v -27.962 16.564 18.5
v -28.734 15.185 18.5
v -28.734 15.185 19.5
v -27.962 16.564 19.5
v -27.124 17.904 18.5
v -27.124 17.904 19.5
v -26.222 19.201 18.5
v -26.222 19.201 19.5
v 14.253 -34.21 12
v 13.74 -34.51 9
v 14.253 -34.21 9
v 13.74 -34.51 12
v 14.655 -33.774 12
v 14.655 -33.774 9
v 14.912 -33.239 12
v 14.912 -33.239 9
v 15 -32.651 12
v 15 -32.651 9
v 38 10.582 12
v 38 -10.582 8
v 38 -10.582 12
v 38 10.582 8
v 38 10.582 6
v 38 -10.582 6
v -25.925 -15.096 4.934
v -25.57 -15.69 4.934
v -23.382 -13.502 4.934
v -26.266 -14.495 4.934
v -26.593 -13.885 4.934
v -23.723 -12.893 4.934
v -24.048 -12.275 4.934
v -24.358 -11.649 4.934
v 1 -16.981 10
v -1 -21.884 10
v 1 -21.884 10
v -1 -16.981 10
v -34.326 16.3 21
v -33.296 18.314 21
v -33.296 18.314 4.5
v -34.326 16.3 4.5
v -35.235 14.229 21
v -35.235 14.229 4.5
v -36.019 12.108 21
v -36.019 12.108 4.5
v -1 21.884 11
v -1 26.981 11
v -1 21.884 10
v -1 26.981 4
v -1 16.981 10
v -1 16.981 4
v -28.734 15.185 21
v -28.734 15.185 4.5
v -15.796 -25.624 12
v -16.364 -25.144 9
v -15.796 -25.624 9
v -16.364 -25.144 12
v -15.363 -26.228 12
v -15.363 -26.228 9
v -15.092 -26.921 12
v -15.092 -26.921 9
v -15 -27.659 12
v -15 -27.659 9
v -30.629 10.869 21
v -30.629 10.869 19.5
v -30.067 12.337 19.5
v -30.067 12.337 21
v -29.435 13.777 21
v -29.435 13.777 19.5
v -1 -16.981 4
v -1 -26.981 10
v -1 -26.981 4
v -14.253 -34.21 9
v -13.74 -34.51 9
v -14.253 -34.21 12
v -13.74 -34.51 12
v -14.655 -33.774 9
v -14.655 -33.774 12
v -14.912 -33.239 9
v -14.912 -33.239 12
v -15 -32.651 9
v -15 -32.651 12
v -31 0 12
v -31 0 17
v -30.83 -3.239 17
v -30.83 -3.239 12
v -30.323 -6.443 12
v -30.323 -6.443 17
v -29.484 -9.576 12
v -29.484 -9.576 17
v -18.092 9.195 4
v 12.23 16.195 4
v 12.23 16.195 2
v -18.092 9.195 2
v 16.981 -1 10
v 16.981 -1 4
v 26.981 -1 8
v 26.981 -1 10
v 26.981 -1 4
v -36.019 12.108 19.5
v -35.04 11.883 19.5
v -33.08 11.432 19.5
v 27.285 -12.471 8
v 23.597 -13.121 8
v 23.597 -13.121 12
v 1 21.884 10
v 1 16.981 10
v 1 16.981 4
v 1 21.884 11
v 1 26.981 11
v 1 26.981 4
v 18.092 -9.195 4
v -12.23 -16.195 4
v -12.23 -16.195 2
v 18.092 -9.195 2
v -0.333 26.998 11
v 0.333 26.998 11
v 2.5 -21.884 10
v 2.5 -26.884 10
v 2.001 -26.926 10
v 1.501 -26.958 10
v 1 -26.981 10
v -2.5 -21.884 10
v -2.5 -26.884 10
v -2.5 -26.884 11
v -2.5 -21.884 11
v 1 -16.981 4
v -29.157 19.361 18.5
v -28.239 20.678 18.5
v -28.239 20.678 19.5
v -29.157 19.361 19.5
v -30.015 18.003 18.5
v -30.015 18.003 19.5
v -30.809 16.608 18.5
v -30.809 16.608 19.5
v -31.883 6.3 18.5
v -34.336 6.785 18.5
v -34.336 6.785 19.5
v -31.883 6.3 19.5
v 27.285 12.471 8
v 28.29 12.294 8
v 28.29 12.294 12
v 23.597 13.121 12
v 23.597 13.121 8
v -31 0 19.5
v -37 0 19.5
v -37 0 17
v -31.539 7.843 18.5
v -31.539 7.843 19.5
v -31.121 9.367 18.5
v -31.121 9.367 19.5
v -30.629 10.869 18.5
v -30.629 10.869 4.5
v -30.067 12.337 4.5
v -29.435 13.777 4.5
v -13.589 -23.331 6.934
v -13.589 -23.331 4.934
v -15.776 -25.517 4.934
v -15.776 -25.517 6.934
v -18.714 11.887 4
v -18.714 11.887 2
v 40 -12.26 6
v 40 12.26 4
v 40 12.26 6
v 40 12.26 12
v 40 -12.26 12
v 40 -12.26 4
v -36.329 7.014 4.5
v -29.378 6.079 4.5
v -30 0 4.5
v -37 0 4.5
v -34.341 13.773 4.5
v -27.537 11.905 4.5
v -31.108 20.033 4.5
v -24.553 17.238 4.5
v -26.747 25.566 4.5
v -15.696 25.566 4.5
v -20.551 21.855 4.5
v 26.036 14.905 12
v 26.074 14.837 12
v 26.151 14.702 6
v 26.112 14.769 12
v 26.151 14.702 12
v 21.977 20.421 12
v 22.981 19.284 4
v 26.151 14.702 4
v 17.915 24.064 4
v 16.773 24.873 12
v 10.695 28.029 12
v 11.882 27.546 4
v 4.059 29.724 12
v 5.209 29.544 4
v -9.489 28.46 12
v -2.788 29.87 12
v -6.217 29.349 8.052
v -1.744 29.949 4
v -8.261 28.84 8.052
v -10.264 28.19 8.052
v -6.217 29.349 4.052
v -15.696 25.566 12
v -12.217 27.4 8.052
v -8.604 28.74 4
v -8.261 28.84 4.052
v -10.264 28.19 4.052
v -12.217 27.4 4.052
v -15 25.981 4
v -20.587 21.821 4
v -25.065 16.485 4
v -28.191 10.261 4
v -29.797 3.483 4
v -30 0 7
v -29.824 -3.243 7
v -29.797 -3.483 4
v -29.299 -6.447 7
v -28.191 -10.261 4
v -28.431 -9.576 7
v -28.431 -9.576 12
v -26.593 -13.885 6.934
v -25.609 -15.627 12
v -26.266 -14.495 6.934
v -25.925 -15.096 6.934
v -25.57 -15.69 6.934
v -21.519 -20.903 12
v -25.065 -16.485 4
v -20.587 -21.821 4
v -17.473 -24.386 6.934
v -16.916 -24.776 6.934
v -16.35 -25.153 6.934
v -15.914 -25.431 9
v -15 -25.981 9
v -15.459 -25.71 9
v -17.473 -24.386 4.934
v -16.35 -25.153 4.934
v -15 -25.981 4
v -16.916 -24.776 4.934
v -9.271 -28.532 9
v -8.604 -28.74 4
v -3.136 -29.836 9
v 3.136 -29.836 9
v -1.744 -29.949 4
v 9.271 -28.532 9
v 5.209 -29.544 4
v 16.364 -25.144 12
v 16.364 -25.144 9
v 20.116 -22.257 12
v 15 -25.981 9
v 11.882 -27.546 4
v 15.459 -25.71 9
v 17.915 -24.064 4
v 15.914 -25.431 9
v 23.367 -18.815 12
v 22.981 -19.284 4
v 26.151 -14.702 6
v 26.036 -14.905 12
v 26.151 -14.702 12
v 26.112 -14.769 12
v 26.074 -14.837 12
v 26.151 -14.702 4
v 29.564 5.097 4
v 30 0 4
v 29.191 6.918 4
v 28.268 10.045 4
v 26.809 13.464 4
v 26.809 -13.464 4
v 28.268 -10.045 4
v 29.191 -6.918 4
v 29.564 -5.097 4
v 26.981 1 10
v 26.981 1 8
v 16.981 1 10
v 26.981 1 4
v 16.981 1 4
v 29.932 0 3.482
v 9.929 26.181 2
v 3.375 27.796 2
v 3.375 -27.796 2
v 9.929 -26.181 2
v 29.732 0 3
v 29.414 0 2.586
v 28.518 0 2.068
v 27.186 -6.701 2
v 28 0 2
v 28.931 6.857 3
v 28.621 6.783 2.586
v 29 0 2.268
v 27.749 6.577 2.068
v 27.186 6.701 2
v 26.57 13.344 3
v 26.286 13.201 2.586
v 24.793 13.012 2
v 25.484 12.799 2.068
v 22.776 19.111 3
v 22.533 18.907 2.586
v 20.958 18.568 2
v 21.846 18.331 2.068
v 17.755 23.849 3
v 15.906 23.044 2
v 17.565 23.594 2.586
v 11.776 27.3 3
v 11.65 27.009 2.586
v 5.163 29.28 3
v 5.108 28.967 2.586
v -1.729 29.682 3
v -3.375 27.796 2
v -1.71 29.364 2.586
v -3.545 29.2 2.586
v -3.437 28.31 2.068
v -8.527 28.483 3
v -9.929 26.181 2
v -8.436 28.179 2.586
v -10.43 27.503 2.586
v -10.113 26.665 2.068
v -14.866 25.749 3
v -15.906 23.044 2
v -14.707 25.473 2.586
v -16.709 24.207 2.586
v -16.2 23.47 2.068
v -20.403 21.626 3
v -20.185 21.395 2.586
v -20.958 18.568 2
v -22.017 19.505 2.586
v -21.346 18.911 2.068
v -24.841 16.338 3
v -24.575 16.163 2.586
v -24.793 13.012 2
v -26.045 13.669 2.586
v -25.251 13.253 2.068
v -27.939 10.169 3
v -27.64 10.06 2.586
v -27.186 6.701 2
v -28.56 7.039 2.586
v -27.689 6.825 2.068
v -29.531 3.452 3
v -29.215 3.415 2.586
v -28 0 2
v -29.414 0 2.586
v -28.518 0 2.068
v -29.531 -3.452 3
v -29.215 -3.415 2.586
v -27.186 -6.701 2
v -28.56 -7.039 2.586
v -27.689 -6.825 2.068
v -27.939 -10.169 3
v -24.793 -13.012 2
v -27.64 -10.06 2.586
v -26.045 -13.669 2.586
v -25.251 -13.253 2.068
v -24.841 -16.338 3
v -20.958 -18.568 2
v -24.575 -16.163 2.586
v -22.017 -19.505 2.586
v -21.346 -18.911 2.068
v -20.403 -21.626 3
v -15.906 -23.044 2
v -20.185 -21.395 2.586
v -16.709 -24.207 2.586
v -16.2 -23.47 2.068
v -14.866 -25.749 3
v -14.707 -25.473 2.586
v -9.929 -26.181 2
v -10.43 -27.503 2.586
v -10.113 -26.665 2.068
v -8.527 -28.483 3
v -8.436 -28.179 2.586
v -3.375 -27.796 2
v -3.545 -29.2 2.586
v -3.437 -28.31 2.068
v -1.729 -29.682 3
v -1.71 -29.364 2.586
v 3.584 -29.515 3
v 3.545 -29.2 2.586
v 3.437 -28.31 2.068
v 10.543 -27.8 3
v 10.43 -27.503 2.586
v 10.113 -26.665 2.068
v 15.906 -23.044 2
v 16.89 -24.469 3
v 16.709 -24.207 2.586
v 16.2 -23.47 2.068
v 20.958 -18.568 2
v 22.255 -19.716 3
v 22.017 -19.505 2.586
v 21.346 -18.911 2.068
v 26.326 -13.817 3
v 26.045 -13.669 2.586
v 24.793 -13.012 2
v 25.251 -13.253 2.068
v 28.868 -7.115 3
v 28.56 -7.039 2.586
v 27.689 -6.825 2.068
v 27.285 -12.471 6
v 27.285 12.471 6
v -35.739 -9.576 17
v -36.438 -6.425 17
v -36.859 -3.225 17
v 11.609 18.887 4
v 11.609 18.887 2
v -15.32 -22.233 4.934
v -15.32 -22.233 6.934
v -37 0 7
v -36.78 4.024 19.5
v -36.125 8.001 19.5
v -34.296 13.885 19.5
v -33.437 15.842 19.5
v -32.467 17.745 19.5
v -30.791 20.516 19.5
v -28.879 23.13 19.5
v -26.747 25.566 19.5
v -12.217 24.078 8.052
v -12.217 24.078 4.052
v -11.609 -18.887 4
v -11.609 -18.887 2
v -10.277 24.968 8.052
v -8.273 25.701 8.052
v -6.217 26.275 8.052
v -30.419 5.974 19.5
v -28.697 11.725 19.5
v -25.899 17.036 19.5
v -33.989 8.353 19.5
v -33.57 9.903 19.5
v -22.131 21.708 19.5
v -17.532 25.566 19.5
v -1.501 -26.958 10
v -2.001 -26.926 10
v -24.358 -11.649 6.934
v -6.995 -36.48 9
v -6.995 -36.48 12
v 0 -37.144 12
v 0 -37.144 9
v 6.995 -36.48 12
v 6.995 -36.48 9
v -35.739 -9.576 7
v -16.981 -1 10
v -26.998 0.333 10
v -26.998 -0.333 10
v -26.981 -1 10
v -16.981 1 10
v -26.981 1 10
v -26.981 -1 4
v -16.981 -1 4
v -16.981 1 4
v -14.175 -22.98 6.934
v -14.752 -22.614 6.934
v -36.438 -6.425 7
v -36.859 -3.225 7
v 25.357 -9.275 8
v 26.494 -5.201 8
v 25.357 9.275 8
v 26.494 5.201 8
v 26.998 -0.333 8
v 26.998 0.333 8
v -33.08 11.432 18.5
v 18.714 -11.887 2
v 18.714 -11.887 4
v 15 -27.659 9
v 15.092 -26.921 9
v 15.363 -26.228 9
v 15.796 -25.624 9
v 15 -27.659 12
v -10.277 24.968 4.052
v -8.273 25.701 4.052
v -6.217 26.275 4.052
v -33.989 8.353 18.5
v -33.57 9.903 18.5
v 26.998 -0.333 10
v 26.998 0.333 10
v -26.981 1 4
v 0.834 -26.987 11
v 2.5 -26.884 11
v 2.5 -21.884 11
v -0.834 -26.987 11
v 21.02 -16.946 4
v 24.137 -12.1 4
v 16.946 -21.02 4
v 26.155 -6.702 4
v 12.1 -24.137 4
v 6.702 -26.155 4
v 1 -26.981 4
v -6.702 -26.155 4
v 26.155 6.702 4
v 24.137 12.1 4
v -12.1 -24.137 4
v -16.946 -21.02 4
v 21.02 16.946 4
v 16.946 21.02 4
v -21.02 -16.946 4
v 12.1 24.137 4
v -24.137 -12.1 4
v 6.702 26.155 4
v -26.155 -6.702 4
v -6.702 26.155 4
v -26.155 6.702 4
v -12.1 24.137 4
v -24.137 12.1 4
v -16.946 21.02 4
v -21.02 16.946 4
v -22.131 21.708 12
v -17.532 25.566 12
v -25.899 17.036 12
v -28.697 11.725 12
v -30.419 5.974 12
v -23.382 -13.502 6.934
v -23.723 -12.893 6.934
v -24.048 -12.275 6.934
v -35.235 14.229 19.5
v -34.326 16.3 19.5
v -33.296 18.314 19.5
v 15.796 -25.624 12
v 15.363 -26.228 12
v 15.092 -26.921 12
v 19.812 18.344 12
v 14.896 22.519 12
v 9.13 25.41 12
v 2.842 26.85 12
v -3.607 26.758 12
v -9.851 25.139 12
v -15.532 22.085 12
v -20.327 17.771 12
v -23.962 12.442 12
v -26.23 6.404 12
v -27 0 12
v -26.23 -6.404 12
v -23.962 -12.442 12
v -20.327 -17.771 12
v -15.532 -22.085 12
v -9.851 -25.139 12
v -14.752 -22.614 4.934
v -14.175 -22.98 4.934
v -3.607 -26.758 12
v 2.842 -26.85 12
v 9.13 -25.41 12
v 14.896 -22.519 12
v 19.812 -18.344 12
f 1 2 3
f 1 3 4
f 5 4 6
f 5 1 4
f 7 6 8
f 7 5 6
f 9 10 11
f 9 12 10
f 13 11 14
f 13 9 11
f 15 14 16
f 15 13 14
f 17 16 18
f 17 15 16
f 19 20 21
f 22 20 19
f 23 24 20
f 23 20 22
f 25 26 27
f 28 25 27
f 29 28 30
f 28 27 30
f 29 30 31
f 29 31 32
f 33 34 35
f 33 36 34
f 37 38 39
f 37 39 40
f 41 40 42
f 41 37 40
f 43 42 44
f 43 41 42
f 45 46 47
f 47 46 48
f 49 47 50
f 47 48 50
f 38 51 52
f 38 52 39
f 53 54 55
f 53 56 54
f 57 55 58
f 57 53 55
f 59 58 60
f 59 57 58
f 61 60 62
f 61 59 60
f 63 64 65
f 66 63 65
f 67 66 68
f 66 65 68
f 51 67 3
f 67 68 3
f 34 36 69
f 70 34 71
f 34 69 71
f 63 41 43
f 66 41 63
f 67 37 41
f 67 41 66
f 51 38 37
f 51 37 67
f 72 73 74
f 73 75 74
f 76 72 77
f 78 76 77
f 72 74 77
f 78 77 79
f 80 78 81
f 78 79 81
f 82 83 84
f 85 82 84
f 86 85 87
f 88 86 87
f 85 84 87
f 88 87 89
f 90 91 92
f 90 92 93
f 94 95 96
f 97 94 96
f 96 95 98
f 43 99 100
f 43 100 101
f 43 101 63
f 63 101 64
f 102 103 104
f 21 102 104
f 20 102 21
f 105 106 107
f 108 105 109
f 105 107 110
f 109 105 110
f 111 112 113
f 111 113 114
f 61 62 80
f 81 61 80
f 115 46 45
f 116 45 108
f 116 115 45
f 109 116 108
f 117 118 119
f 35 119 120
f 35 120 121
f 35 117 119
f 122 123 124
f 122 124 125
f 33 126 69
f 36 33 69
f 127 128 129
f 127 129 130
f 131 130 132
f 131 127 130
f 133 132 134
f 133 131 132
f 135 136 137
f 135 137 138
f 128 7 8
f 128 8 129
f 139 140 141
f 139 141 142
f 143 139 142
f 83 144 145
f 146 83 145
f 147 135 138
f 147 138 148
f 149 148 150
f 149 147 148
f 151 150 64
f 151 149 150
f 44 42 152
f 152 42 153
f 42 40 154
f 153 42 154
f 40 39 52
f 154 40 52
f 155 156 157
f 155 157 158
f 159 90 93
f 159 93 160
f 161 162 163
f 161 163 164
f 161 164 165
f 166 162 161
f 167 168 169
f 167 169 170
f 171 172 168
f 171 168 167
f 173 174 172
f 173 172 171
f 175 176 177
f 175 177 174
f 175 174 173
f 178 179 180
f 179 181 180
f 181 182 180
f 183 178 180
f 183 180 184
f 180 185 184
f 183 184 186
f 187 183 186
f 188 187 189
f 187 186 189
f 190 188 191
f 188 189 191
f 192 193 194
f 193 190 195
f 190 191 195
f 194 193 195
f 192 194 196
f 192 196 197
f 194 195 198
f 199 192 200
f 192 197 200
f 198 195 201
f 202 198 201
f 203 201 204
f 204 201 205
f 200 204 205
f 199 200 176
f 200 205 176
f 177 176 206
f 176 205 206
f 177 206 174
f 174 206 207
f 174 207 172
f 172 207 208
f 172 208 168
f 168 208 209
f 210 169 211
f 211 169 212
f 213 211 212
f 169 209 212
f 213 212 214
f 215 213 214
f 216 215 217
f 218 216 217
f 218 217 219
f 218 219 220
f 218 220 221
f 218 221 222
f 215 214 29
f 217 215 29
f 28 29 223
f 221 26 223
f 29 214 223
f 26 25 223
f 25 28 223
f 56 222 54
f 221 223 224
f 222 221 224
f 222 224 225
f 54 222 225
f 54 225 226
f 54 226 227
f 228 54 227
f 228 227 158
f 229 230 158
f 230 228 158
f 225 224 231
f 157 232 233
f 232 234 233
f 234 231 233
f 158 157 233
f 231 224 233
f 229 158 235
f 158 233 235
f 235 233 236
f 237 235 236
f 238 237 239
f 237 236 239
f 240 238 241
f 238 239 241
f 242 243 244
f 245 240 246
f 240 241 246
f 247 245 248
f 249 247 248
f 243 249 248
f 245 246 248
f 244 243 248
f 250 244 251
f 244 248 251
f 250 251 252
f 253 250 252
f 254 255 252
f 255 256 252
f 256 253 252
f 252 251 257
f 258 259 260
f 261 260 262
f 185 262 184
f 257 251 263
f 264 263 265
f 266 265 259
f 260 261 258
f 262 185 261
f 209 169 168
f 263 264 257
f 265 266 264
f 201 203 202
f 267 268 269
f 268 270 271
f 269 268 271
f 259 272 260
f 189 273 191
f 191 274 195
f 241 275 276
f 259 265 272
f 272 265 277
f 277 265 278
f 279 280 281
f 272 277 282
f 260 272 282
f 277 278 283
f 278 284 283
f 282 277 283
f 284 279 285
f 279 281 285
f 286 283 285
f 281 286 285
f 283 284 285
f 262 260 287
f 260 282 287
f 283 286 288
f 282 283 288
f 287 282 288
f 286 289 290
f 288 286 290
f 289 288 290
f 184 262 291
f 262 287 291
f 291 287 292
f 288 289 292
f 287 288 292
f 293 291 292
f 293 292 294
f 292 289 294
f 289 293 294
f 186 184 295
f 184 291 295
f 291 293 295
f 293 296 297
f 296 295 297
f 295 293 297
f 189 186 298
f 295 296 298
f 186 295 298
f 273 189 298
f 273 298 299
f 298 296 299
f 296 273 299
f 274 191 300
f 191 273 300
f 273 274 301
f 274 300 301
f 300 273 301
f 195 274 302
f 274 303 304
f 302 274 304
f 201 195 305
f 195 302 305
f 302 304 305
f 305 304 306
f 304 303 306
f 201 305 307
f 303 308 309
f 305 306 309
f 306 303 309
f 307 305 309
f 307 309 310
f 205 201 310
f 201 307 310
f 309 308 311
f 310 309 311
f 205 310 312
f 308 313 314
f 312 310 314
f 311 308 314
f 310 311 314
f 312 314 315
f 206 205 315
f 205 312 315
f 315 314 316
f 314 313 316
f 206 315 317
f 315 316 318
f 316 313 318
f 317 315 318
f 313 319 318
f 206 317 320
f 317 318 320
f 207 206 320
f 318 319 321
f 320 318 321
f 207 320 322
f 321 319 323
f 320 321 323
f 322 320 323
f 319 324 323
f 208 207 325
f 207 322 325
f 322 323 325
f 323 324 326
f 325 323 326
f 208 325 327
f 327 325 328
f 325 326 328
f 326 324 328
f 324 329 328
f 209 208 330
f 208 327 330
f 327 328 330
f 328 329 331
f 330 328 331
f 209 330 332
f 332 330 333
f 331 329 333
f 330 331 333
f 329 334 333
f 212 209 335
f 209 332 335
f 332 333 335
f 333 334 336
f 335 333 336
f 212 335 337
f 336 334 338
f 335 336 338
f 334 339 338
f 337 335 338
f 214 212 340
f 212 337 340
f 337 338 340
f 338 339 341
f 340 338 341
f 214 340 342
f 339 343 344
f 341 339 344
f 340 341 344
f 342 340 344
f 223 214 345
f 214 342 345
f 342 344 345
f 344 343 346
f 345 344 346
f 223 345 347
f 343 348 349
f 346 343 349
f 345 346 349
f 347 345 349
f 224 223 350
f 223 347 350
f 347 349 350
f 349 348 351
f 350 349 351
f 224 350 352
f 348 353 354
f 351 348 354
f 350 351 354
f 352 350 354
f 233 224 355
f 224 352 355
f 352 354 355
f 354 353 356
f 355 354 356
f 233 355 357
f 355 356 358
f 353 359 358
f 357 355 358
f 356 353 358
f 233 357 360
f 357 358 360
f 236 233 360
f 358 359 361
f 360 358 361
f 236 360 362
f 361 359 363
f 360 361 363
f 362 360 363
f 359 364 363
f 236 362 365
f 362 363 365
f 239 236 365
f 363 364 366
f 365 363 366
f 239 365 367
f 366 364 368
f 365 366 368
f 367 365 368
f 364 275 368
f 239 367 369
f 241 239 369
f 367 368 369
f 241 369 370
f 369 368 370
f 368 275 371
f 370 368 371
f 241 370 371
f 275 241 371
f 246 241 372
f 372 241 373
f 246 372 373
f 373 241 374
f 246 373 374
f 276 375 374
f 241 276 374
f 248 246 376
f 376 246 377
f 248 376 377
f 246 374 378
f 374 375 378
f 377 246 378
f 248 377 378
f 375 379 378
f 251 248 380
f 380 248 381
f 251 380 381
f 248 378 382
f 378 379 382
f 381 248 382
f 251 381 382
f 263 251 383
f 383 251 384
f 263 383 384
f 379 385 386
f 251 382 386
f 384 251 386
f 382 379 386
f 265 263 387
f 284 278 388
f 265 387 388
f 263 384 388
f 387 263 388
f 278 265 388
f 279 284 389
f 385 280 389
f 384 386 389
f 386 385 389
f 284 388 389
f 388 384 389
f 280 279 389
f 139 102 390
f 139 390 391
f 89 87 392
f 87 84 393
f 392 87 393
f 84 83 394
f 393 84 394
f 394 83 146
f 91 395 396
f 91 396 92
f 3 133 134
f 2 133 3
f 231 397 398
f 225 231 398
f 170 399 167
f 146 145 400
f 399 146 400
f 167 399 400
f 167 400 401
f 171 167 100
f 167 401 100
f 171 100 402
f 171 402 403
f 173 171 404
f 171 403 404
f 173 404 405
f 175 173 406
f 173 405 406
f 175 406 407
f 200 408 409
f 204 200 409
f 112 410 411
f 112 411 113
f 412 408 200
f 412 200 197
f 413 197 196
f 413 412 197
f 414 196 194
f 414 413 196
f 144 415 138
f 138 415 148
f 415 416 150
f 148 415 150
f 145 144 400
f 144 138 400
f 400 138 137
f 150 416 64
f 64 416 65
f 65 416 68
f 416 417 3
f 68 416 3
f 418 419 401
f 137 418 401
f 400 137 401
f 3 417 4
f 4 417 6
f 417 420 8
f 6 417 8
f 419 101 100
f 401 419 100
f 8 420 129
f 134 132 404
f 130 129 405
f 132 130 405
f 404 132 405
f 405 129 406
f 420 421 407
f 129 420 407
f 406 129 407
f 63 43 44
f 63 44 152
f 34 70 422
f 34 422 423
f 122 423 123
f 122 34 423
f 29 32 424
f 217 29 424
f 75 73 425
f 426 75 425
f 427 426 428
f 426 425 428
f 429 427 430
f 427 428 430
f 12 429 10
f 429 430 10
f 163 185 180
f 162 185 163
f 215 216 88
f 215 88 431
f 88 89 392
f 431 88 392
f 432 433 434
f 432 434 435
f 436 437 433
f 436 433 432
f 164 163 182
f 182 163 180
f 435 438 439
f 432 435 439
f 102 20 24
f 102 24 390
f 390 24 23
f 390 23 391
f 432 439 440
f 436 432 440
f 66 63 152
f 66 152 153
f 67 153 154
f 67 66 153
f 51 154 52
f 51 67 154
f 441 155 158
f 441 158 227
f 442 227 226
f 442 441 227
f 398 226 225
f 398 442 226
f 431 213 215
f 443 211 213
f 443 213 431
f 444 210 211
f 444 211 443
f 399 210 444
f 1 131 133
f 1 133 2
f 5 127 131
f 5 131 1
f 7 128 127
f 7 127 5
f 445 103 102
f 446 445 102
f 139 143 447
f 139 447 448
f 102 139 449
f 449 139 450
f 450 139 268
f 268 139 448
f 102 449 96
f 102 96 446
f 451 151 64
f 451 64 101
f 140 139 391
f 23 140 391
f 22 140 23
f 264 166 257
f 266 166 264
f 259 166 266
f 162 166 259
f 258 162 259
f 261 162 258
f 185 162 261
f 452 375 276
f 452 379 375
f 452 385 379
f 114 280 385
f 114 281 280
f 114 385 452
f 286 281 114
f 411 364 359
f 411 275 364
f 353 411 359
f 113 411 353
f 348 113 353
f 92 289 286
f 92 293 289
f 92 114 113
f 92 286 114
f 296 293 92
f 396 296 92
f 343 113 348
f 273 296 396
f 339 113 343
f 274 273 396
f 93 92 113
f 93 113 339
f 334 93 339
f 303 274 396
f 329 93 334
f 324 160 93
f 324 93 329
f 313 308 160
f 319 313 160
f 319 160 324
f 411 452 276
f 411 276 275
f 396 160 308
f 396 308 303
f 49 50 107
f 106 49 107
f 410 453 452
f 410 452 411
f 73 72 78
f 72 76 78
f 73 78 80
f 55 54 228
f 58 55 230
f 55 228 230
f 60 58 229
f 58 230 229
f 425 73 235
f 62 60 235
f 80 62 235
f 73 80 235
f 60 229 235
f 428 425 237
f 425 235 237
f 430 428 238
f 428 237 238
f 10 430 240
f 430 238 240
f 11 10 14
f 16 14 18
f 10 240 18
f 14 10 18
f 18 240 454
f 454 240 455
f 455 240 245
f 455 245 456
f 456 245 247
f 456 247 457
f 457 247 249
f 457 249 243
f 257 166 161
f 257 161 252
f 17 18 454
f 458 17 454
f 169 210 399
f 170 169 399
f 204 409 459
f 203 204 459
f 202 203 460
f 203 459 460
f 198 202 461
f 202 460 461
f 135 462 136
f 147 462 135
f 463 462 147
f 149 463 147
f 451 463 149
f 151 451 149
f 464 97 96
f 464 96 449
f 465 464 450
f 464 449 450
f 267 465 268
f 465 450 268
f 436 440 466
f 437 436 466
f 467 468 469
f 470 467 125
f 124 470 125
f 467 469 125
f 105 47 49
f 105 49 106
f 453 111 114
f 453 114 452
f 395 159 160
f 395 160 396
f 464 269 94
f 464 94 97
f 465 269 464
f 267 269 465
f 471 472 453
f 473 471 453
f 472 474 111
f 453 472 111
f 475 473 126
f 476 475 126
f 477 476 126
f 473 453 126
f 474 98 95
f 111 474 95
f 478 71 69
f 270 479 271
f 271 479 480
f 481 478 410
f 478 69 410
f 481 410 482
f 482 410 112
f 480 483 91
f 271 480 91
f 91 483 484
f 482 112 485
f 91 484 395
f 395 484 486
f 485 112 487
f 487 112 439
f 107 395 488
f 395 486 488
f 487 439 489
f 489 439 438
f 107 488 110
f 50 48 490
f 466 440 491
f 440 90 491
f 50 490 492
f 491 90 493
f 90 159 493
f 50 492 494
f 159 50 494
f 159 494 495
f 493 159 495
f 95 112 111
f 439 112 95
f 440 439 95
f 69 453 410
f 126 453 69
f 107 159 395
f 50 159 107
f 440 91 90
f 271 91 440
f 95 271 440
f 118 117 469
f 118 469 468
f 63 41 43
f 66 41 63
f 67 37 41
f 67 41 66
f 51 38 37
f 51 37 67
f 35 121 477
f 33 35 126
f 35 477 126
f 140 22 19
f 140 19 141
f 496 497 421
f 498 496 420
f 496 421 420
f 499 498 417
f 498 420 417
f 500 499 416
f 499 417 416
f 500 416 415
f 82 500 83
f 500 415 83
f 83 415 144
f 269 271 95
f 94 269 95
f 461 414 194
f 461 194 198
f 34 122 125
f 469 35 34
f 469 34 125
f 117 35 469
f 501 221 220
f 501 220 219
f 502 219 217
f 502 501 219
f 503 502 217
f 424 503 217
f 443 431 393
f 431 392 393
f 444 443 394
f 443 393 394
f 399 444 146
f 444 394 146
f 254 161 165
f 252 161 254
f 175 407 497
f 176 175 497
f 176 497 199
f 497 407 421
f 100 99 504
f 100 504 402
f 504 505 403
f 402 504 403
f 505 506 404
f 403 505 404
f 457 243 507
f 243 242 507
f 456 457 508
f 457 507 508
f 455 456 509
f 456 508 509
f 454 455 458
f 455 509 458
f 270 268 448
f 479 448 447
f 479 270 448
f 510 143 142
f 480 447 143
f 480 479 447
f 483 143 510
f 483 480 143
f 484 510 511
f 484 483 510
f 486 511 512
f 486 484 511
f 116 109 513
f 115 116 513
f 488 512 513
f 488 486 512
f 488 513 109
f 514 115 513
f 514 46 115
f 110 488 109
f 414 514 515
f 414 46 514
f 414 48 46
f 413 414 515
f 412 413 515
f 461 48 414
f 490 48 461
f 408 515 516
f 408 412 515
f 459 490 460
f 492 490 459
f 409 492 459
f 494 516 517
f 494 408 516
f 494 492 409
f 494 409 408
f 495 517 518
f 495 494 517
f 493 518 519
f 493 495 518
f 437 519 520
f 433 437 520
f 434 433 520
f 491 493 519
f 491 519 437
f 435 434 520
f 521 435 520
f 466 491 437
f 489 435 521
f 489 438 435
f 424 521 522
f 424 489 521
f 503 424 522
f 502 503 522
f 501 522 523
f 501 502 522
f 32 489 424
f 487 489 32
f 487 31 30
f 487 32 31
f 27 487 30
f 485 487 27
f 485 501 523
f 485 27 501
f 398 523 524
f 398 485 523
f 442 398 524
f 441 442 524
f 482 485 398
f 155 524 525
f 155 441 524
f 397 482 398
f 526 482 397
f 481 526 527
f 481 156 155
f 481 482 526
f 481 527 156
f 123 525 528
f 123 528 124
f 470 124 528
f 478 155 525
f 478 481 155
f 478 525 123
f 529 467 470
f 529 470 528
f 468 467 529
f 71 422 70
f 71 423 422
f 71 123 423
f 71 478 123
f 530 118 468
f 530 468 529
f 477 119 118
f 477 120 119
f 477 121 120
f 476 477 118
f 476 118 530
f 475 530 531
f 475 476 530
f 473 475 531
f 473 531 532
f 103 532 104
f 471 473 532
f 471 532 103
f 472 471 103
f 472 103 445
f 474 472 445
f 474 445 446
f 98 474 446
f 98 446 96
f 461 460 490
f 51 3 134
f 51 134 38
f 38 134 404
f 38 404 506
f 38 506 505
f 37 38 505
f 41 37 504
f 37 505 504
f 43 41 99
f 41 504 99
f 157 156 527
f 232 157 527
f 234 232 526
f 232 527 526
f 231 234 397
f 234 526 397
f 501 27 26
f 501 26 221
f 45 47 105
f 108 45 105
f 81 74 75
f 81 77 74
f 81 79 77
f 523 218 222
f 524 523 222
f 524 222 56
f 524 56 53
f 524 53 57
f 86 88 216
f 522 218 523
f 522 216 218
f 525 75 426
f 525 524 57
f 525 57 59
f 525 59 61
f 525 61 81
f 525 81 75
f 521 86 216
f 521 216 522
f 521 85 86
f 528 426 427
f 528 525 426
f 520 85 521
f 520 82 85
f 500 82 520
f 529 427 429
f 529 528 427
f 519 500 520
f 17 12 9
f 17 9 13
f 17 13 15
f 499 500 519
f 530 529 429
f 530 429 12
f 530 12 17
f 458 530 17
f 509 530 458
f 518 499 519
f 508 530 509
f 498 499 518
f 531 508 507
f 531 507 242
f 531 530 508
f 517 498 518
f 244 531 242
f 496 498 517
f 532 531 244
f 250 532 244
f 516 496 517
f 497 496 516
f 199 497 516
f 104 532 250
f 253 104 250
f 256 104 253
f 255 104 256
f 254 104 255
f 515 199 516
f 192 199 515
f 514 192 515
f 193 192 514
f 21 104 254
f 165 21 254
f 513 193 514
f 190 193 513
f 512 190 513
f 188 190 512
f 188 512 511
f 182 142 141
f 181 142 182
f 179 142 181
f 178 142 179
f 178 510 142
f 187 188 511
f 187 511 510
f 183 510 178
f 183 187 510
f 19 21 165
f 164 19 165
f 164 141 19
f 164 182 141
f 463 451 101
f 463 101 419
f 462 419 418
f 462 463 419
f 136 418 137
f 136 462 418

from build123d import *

# Parameters (mm, degrees)
SKETCH_1_R           = 30
EXTRUDE_1_DEPTH      = 2
SKETCH_5_R           = 30
SKETCH_5_R_2         = 27
EXTRUDE_2_DEPTH      = 10
EXTRUDE_START        = -3
EXTRUDE_3_DEPTH      = 3
FILLET_2_R           = 3
FILLET_3_R           = 3
EXTRUDE_START_2      = -6
EXTRUDE_4_DEPTH      = 6
EXTRUDE_6_DEPTH      = 7.5
SKETCH_14_R          = 31
CUT_EXTRUDE_3_DEPTH  = 7.5
CHAMFER_4_SIZE       = 2.644904711
CHAMFER_4_SIZE_2     = 15
CHAMFER_5_SIZE       = 2.644904711
CHAMFER_5_SIZE_2     = 15
CUT_EXTRUDE_START    = -4
CUT_EXTRUDE_6_DEPTH  = 4
EXTRUDE_10_DEPTH     = 5
CUT_EXTRUDE_START_2  = 6
CUT_EXTRUDE_7_DEPTH  = 6
EXTRUDE_11_DEPTH     = 8
EXTRUDE_12_DEPTH     = 1
EXTRUDE_13_DEPTH     = 1.5
EXTRUDE_14_DEPTH     = 16.5
CUT_EXTRUDE_START_3  = -1
CUT_EXTRUDE_8_DEPTH  = 1
EXTRUDE_START_3      = 2
EXTRUDE_15_DEPTH     = 2
CUT_EXTRUDE_9_DEPTH  = 2
SKETCH_33_R          = 30
CUT_EXTRUDE_10_DEPTH = 2
SKETCH_34_R          = 30
EXTRUDE_16_DEPTH     = 2
FILLET_4_R           = 2
FILLET_5_R           = 2
CUT_EXTRUDE_11_DEPTH = 10
FILLET_6_R           = 2
SKETCH_37_W          = 2
SKETCH_37_H          = 2
CUT_EXTRUDE_12_DEPTH = 65
SKETCH_38_W          = 6
SKETCH_38_H          = 4
CUT_EXTRUDE_14_DEPTH = 45


# Some blends are built 0.0001 mm under size
with BuildPart() as part:
    # 草图1 → 凸台-拉伸1 (new body)
    with BuildSketch(Plane.XY):
        Circle(SKETCH_1_R)
    extrude(amount=EXTRUDE_1_DEPTH)

    # 草图5 → 凸台-拉伸2 (add)
    with BuildSketch(Plane.XY.offset(2)):
        Circle(SKETCH_5_R)
        Circle(SKETCH_5_R_2, mode=Mode.SUBTRACT)
    extrude(amount=EXTRUDE_2_DEPTH)

    # 草图6 → 凸台-拉伸3 (add)
    with BuildSketch(Plane.XY.offset(12).offset(EXTRUDE_START)):
        with BuildLine():
            Line((-15, -25.980762114), (-15, -33.980762114))
            ThreePointArc((-15, -33.980762114), (0, -37.144208079), (15, -33.980762114))
            Line((15, -33.980762114), (15, -25.980762114))
            ThreePointArc((15, -25.980762114), (0, -30), (-15, -25.980762114))
        make_face()
    extrude(amount=EXTRUDE_3_DEPTH)

    # 圆角2
    fillet_2_edges = [part.edges().sort_by_distance(p)[0] for p in [
        (-15, -25.980762114, 10.5),
    ]]
    fillet(fillet_2_edges, radius=FILLET_2_R)

    # 圆角3
    fillet_3_edges = [part.edges().sort_by_distance(p)[0] for p in [
        (15, -25.980762114, 10.5),
    ]]
    fillet(fillet_3_edges, radius=FILLET_3_R)

    # 草图8 → 凸台-拉伸4 (add)
    with BuildSketch(Plane.XY.offset(12).offset(EXTRUDE_START_2)):
        with BuildLine():
            Line((26.035573303, -14.90466111), (40, -14.90466111))
            Line((40, -14.90466111), (40, 14.90466111))
            Line((40, 14.90466111), (26.035573303, 14.90466111))
            ThreePointArc((26.035573303, 14.90466111), (30, 0), (26.035573303, -14.90466111))
        make_face()
    extrude(amount=EXTRUDE_4_DEPTH)

    # 草图13 → 凸台-拉伸6 (add, symmetric)
    with BuildSketch(Plane.XY.offset(12)):
        with BuildLine():
            Line((-26.746575291, 25.566006927), (-15.696473801, 25.566006927))
            ThreePointArc((-15.696473801, 25.566006927), (-26.181044804, 14.647624141), (-30, 0))
            Line((-30, 0), (-37, 0))
            ThreePointArc((-37, 0), (-34.341107188, 13.772739637), (-26.746575291, 25.566006927))
        make_face()
    extrude(amount=EXTRUDE_6_DEPTH, both=True)

    # 草图14 → 切除-拉伸3 (cut)
    with BuildSketch(Plane.XY.offset(19.5)):
        Circle(SKETCH_14_R)
    extrude(amount=-CUT_EXTRUDE_3_DEPTH, mode=Mode.SUBTRACT)

    # 倒角4
    # the kernel refuses this chamfer: 15, 2.644904711 mm, written as the material it takes off along each edge
    with BuildSketch(Plane(origin=(40, 14.90466111, -32.978081946), x_dir=(0.21013876076743002, -0.9776715712462589, 0), z_dir=(0, 0, 1))) as chamfer_4_piece_1_section:
        Polygon((CHAMFER_4_SIZE * 0.977671571108, -CHAMFER_4_SIZE * 0.210138760738), (-CHAMFER_4_SIZE_2 * 0.210138760767, -CHAMFER_4_SIZE_2 * 0.977671571246), (0, 0), align=None)
    chamfer_4_piece_1 = extrude(amount=83.956163893, mode=Mode.PRIVATE)
    chamfer_4_piece_1 = chamfer_4_piece_1 - Plane(origin=(0, 0, 9), x_dir=(1, 0, 0), z_dir=(0, 0, -1)) * Cylinder(30, 227, mode=Mode.PRIVATE)
    add(chamfer_4_piece_1, mode=Mode.SUBTRACT)

    # 倒角5
    # the kernel refuses this chamfer: 15, 2.644904711 mm, written as the material it takes off along each edge
    with BuildSketch(Plane(origin=(40, -14.90466111, -32.978081946), x_dir=(0.21013876076743002, 0.9776715712462589, 0), z_dir=(0, 0, 1))) as chamfer_5_piece_1_section:
        Polygon((CHAMFER_5_SIZE * 0.977671571108, CHAMFER_5_SIZE * 0.210138760738), (-CHAMFER_5_SIZE_2 * 0.210138760767, CHAMFER_5_SIZE_2 * 0.977671571246), (0, 0), align=None)
    chamfer_5_piece_1 = extrude(amount=83.956163893, mode=Mode.PRIVATE)
    chamfer_5_piece_1 = chamfer_5_piece_1 - Plane(origin=(0, 0, 9), x_dir=(1, 0, 0), z_dir=(0, 0, -1)) * Cylinder(30, 227, mode=Mode.PRIVATE)
    add(chamfer_5_piece_1, mode=Mode.SUBTRACT)

    # 草图16 → 切除-拉伸6 (cut)
    with BuildSketch(Plane.XY.offset(12).offset(CUT_EXTRUDE_START)):
        with BuildLine():
            ThreePointArc((27, 0), (26.135503138, 6.77757152), (23.59737217, 13.121129016))
            Line((23.59737217, 13.121129016), (18.746765164, 13.976421904))
            Line((18.746765164, 13.976421904), (22.28876202, -13.351872293))
            Line((22.28876202, -13.351872293), (23.59737217, -13.121129016))
            ThreePointArc((23.59737217, -13.121129016), (26.135503138, -6.77757152), (27, 0))
        make_face()
        with BuildLine():
            Line((18.746765164, 13.976421904), (23.59737217, 13.121129016))
            ThreePointArc((23.59737217, 13.121129016), (-27, 0), (23.59737217, -13.121129016))
            Line((23.59737217, -13.121129016), (22.28876202, -13.351872293))
            Line((22.28876202, -13.351872293), (18.746765164, 13.976421904))
        make_face()
        with BuildLine():
            Line((38, 10.581557137), (28.290235639, 12.29365057))
            Line((28.290235639, 12.29365057), (23.59737217, 13.121129016))
            ThreePointArc((23.59737217, 13.121129016), (26.135503138, 6.77757152), (27, 0))
            ThreePointArc((27, 0), (26.135503138, -6.77757152), (23.59737217, -13.121129016))
            Line((23.59737217, -13.121129016), (38, -10.581557137))
            Line((38, -10.581557137), (38, 10.581557137))
        make_face()
    extrude(amount=CUT_EXTRUDE_6_DEPTH, mode=Mode.SUBTRACT)

    # 草图17 → 凸台-拉伸10 (add, symmetric)
    with BuildSketch(Plane.XY.offset(12)):
        with BuildLine():
            Line((-28.430518618, -9.576304669), (-35.739255573, -9.576304669))
            ThreePointArc((-35.739255573, -9.576304669), (-36.683459871, -4.829469112), (-37, 0))
            Line((-37, 0), (-31, 0))
            Line((-31, 0), (-30, 0))
            ThreePointArc((-30, 0), (-29.605029628, -4.852032639), (-28.430518618, -9.576304669))
        make_face()
    extrude(amount=EXTRUDE_10_DEPTH, both=True)

    # 草图18 → 切除-拉伸7 (cut)
    with BuildSketch(Plane.XY.offset(12).offset(CUT_EXTRUDE_START_2)):
        with BuildLine():
            ThreePointArc((-31, 0), (-30.618603506, -4.847795306), (-29.483798753, -9.576304669))
            Line((-29.483798753, -9.576304669), (-28.430518618, -9.576304669))
            ThreePointArc((-28.430518618, -9.576304669), (-29.605029628, -4.852032639), (-30, 0))
            Line((-30, 0), (-31, 0))
        make_face()
    extrude(amount=-CUT_EXTRUDE_7_DEPTH, mode=Mode.SUBTRACT)

    # 草图19 → 凸台-拉伸11 (add)
    with BuildSketch(Plane.XY.offset(2)):
        with BuildLine():
            Line((-1, 26.981475126), (-1, 16.981475126))
            Line((-1, 16.981475126), (1, 16.981475126))
            Line((1, 16.981475126), (1, 26.981475126))
            ThreePointArc((1, 26.981475126), (0, 27), (-1, 26.981475126))
        make_face()
        with BuildLine():
            Line((26.981475126, 1), (16.981475126, 1))
            Line((16.981475126, 1), (16.981475126, -1))
            Line((16.981475126, -1), (26.981475126, -1))
            ThreePointArc((26.981475126, -1), (27, 0), (26.981475126, 1))
        make_face()
        with BuildLine():
            Line((1, -26.981475126), (1, -16.981475126))
            Line((1, -16.981475126), (-1, -16.981475126))
            Line((-1, -16.981475126), (-1, -26.981475126))
            ThreePointArc((-1, -26.981475126), (0, -27), (1, -26.981475126))
        make_face()
        with BuildLine():
            Line((-26.981475126, -1), (-16.981475126, -1))
            Line((-16.981475126, -1), (-16.981475126, 1))
            Line((-16.981475126, 1), (-26.981475126, 1))
            ThreePointArc((-26.981475126, 1), (-27, 0), (-26.981475126, -1))
        make_face()
    extrude(amount=EXTRUDE_11_DEPTH)

    # 草图20 → 凸台-拉伸12 (add)
    with BuildSketch(Plane.XY.offset(10)):
        with BuildLine():
            ThreePointArc((2.5, -26.884010118), (0, -27), (-2.5, -26.884010118))
            Line((-2.5, -26.884010118), (-2.5, -21.884010118))
            Line((-2.5, -21.884010118), (2.5, -21.884010118))
            Line((2.5, -21.884010118), (2.5, -26.884010118))
        make_face()
        with BuildLine():
            ThreePointArc((1, 26.981475126), (0, 27), (-1, 26.981475126))
            Line((-1, 26.981475126), (-1, 21.884010118))
            Line((-1, 21.884010118), (1, 21.884010118))
            Line((1, 21.884010118), (1, 26.981475126))
        make_face()
    extrude(amount=EXTRUDE_12_DEPTH)

    # 草图21 → 凸台-拉伸13 (add)
    with BuildSketch(Plane.XY.offset(19.5)):
        with BuildLine():
            Line((-28.734434843, 15.184935109), (-33.295866493, 18.31352709))
            ThreePointArc((-33.295866493, 18.31352709), (-34.796265088, 15.271540063), (-36.019428995, 12.10787904))
            Line((-36.019428995, 12.10787904), (-30.628781703, 10.868658214))
            ThreePointArc((-30.628781703, 10.868658214), (-29.759963562, 13.061185581), (-28.734434843, 15.184935109))
        make_face()
    extrude(amount=EXTRUDE_13_DEPTH)

    # 草图28 → 切除-拉伸8 (cut)
    with BuildSketch(Plane.XY.offset(19.5).offset(CUT_EXTRUDE_START_3)):
        with BuildLine():
            Line((-34.336052546, 6.784946244), (-31.883477364, 6.300307226))
            ThreePointArc((-31.883477364, 6.300307226), (-31.339481347, 8.60737526), (-30.628781703, 10.868658214))
            Line((-30.628781703, 10.868658214), (-33.080272788, 11.432215546))
            ThreePointArc((-33.080272788, 11.432215546), (-33.788156333, 9.130196691), (-34.336052546, 6.784946244))
        make_face()
        with BuildLine():
            ThreePointArc((-28.734434843, 15.184935109), (-27.551258788, 17.238855508), (-26.22152974, 19.201077524))
            Line((-26.22152974, 19.201077524), (-28.23857049, 20.678083487))
            ThreePointArc((-28.23857049, 20.678083487), (-29.593761465, 18.687142166), (-30.80882562, 16.607717))
            Line((-30.80882562, 16.607717), (-28.734434843, 15.184935109))
        make_face()
    extrude(amount=CUT_EXTRUDE_8_DEPTH, mode=Mode.SUBTRACT)

    # 草图31 → 凸台-拉伸15 (add)
    with BuildSketch(Plane(origin=(0, 0, 6), x_dir=(-1, 0, 0), z_dir=(0, 0, -1)).offset(EXTRUDE_START_3)):
        with BuildLine():
            Line((-40, 12.259756399), (-40, -12.259756399))
            Line((-40, -12.259756399), (-26.150680767, -14.701765044))
            ThreePointArc((-26.150680767, -14.701765044), (-30, 0), (-26.150680767, 14.701765044))
            Line((-26.150680767, 14.701765044), (-40, 12.259756399))
        make_face()
    extrude(amount=-EXTRUDE_15_DEPTH)

    # 草图32 → 切除-拉伸9 (cut)
    with BuildSketch(Plane.XY.offset(8)):
        Polygon((38, -10.581557137), (27.285107826, -12.470881722), (27.285107826, 12.470881722), (38, 10.581557137), align=None)
    extrude(amount=-CUT_EXTRUDE_9_DEPTH, mode=Mode.SUBTRACT)

    # 草图33 → 切除-拉伸10 (cut)
    with BuildSketch(Plane(origin=(0, 0, 0), x_dir=(-1, 0, 0), z_dir=(0, 0, -1))):
        Circle(SKETCH_33_R)
    extrude(amount=-CUT_EXTRUDE_10_DEPTH, mode=Mode.SUBTRACT)

    # 草图34 → 凸台-拉伸16 (add)
    with BuildSketch(Plane(origin=(0, 0, 2), x_dir=(-1, 0, 0), z_dir=(0, 0, -1))):
        Circle(SKETCH_34_R)
    extrude(amount=-EXTRUDE_16_DEPTH)

    # 圆角4
    fillet_4_edges = [part.edges().sort_by_distance(p)[0] for p in [
        (-15, -33.980762114, 10.5),
    ]]
    fillet(fillet_4_edges, radius=FILLET_4_R)

    # 圆角5
    fillet_5_edges = [part.edges().sort_by_distance(p)[0] for p in [
        (15, -33.980762114, 10.5),
    ]]
    fillet(fillet_5_edges, radius=FILLET_5_R)

    # 草图35 → 切除-拉伸11 (cut)
    with BuildSketch(Plane.XY.offset(4)):
        Polygon((-18.713756069, 11.886896156), (11.608940239, 18.887442203), (12.230438934, 16.195435598), (-18.092257374, 9.194889552), align=None)
        Polygon((-12.230438934, -16.195435598), (18.092257374, -9.194889552), (18.713756069, -11.886896156), (-11.608940239, -18.887442203), align=None)
    extrude(amount=-CUT_EXTRUDE_11_DEPTH, mode=Mode.SUBTRACT)

    # 圆角6
    fillet_6_edges = [part.edges().sort_by_distance(p)[0] for p in [
        (-30, 0, 2),
    ]]
    fillet(fillet_6_edges, radius=FILLET_6_R - 0.0001)  # a hair under: the kernel refuses the full size

    # 草图37 → 切除-拉伸12 (cut)
    with BuildSketch(Plane(origin=(7.990737563, 7.990737563, 0), x_dir=(0, 0, 1), z_dir=(-0.7071067811865475, -0.7071067811865476, 0))):
        with Locations((5.93438389, 7.985973932)):
            Rectangle(SKETCH_37_W, SKETCH_37_H)
        with Locations((5.93438389, -5.888371601)):
            Rectangle(SKETCH_37_W, SKETCH_37_H)
    extrude(amount=CUT_EXTRUDE_12_DEPTH, mode=Mode.SUBTRACT)

    # 草图38 → 切除-拉伸14 (cut)
    with BuildSketch(Plane(origin=(0, 0, 0), x_dir=(1, 0, 0), z_dir=(0, 1, 0))):
        with Locations((-9.216767384, -6.051868465)):
            Rectangle(SKETCH_38_W, SKETCH_38_H)
    extrude(amount=CUT_EXTRUDE_14_DEPTH, mode=Mode.SUBTRACT)


with BuildPart() as body_2:
    # 草图26 → 凸台-拉伸14 (new body)
    with BuildSketch(Plane.XY.offset(21)):
        with BuildLine():
            Line((-28.734434843, 15.184935109), (-33.295866493, 18.31352709))
            ThreePointArc((-33.295866493, 18.31352709), (-34.796265088, 15.271540063), (-36.019428995, 12.10787904))
            Line((-36.019428995, 12.10787904), (-30.628781703, 10.868658214))
            ThreePointArc((-30.628781703, 10.868658214), (-29.759963562, 13.061185581), (-28.734434843, 15.184935109))
        make_face()
    extrude(amount=-EXTRUDE_14_DEPTH)


solid = Compound([part.part, body_2.part])
